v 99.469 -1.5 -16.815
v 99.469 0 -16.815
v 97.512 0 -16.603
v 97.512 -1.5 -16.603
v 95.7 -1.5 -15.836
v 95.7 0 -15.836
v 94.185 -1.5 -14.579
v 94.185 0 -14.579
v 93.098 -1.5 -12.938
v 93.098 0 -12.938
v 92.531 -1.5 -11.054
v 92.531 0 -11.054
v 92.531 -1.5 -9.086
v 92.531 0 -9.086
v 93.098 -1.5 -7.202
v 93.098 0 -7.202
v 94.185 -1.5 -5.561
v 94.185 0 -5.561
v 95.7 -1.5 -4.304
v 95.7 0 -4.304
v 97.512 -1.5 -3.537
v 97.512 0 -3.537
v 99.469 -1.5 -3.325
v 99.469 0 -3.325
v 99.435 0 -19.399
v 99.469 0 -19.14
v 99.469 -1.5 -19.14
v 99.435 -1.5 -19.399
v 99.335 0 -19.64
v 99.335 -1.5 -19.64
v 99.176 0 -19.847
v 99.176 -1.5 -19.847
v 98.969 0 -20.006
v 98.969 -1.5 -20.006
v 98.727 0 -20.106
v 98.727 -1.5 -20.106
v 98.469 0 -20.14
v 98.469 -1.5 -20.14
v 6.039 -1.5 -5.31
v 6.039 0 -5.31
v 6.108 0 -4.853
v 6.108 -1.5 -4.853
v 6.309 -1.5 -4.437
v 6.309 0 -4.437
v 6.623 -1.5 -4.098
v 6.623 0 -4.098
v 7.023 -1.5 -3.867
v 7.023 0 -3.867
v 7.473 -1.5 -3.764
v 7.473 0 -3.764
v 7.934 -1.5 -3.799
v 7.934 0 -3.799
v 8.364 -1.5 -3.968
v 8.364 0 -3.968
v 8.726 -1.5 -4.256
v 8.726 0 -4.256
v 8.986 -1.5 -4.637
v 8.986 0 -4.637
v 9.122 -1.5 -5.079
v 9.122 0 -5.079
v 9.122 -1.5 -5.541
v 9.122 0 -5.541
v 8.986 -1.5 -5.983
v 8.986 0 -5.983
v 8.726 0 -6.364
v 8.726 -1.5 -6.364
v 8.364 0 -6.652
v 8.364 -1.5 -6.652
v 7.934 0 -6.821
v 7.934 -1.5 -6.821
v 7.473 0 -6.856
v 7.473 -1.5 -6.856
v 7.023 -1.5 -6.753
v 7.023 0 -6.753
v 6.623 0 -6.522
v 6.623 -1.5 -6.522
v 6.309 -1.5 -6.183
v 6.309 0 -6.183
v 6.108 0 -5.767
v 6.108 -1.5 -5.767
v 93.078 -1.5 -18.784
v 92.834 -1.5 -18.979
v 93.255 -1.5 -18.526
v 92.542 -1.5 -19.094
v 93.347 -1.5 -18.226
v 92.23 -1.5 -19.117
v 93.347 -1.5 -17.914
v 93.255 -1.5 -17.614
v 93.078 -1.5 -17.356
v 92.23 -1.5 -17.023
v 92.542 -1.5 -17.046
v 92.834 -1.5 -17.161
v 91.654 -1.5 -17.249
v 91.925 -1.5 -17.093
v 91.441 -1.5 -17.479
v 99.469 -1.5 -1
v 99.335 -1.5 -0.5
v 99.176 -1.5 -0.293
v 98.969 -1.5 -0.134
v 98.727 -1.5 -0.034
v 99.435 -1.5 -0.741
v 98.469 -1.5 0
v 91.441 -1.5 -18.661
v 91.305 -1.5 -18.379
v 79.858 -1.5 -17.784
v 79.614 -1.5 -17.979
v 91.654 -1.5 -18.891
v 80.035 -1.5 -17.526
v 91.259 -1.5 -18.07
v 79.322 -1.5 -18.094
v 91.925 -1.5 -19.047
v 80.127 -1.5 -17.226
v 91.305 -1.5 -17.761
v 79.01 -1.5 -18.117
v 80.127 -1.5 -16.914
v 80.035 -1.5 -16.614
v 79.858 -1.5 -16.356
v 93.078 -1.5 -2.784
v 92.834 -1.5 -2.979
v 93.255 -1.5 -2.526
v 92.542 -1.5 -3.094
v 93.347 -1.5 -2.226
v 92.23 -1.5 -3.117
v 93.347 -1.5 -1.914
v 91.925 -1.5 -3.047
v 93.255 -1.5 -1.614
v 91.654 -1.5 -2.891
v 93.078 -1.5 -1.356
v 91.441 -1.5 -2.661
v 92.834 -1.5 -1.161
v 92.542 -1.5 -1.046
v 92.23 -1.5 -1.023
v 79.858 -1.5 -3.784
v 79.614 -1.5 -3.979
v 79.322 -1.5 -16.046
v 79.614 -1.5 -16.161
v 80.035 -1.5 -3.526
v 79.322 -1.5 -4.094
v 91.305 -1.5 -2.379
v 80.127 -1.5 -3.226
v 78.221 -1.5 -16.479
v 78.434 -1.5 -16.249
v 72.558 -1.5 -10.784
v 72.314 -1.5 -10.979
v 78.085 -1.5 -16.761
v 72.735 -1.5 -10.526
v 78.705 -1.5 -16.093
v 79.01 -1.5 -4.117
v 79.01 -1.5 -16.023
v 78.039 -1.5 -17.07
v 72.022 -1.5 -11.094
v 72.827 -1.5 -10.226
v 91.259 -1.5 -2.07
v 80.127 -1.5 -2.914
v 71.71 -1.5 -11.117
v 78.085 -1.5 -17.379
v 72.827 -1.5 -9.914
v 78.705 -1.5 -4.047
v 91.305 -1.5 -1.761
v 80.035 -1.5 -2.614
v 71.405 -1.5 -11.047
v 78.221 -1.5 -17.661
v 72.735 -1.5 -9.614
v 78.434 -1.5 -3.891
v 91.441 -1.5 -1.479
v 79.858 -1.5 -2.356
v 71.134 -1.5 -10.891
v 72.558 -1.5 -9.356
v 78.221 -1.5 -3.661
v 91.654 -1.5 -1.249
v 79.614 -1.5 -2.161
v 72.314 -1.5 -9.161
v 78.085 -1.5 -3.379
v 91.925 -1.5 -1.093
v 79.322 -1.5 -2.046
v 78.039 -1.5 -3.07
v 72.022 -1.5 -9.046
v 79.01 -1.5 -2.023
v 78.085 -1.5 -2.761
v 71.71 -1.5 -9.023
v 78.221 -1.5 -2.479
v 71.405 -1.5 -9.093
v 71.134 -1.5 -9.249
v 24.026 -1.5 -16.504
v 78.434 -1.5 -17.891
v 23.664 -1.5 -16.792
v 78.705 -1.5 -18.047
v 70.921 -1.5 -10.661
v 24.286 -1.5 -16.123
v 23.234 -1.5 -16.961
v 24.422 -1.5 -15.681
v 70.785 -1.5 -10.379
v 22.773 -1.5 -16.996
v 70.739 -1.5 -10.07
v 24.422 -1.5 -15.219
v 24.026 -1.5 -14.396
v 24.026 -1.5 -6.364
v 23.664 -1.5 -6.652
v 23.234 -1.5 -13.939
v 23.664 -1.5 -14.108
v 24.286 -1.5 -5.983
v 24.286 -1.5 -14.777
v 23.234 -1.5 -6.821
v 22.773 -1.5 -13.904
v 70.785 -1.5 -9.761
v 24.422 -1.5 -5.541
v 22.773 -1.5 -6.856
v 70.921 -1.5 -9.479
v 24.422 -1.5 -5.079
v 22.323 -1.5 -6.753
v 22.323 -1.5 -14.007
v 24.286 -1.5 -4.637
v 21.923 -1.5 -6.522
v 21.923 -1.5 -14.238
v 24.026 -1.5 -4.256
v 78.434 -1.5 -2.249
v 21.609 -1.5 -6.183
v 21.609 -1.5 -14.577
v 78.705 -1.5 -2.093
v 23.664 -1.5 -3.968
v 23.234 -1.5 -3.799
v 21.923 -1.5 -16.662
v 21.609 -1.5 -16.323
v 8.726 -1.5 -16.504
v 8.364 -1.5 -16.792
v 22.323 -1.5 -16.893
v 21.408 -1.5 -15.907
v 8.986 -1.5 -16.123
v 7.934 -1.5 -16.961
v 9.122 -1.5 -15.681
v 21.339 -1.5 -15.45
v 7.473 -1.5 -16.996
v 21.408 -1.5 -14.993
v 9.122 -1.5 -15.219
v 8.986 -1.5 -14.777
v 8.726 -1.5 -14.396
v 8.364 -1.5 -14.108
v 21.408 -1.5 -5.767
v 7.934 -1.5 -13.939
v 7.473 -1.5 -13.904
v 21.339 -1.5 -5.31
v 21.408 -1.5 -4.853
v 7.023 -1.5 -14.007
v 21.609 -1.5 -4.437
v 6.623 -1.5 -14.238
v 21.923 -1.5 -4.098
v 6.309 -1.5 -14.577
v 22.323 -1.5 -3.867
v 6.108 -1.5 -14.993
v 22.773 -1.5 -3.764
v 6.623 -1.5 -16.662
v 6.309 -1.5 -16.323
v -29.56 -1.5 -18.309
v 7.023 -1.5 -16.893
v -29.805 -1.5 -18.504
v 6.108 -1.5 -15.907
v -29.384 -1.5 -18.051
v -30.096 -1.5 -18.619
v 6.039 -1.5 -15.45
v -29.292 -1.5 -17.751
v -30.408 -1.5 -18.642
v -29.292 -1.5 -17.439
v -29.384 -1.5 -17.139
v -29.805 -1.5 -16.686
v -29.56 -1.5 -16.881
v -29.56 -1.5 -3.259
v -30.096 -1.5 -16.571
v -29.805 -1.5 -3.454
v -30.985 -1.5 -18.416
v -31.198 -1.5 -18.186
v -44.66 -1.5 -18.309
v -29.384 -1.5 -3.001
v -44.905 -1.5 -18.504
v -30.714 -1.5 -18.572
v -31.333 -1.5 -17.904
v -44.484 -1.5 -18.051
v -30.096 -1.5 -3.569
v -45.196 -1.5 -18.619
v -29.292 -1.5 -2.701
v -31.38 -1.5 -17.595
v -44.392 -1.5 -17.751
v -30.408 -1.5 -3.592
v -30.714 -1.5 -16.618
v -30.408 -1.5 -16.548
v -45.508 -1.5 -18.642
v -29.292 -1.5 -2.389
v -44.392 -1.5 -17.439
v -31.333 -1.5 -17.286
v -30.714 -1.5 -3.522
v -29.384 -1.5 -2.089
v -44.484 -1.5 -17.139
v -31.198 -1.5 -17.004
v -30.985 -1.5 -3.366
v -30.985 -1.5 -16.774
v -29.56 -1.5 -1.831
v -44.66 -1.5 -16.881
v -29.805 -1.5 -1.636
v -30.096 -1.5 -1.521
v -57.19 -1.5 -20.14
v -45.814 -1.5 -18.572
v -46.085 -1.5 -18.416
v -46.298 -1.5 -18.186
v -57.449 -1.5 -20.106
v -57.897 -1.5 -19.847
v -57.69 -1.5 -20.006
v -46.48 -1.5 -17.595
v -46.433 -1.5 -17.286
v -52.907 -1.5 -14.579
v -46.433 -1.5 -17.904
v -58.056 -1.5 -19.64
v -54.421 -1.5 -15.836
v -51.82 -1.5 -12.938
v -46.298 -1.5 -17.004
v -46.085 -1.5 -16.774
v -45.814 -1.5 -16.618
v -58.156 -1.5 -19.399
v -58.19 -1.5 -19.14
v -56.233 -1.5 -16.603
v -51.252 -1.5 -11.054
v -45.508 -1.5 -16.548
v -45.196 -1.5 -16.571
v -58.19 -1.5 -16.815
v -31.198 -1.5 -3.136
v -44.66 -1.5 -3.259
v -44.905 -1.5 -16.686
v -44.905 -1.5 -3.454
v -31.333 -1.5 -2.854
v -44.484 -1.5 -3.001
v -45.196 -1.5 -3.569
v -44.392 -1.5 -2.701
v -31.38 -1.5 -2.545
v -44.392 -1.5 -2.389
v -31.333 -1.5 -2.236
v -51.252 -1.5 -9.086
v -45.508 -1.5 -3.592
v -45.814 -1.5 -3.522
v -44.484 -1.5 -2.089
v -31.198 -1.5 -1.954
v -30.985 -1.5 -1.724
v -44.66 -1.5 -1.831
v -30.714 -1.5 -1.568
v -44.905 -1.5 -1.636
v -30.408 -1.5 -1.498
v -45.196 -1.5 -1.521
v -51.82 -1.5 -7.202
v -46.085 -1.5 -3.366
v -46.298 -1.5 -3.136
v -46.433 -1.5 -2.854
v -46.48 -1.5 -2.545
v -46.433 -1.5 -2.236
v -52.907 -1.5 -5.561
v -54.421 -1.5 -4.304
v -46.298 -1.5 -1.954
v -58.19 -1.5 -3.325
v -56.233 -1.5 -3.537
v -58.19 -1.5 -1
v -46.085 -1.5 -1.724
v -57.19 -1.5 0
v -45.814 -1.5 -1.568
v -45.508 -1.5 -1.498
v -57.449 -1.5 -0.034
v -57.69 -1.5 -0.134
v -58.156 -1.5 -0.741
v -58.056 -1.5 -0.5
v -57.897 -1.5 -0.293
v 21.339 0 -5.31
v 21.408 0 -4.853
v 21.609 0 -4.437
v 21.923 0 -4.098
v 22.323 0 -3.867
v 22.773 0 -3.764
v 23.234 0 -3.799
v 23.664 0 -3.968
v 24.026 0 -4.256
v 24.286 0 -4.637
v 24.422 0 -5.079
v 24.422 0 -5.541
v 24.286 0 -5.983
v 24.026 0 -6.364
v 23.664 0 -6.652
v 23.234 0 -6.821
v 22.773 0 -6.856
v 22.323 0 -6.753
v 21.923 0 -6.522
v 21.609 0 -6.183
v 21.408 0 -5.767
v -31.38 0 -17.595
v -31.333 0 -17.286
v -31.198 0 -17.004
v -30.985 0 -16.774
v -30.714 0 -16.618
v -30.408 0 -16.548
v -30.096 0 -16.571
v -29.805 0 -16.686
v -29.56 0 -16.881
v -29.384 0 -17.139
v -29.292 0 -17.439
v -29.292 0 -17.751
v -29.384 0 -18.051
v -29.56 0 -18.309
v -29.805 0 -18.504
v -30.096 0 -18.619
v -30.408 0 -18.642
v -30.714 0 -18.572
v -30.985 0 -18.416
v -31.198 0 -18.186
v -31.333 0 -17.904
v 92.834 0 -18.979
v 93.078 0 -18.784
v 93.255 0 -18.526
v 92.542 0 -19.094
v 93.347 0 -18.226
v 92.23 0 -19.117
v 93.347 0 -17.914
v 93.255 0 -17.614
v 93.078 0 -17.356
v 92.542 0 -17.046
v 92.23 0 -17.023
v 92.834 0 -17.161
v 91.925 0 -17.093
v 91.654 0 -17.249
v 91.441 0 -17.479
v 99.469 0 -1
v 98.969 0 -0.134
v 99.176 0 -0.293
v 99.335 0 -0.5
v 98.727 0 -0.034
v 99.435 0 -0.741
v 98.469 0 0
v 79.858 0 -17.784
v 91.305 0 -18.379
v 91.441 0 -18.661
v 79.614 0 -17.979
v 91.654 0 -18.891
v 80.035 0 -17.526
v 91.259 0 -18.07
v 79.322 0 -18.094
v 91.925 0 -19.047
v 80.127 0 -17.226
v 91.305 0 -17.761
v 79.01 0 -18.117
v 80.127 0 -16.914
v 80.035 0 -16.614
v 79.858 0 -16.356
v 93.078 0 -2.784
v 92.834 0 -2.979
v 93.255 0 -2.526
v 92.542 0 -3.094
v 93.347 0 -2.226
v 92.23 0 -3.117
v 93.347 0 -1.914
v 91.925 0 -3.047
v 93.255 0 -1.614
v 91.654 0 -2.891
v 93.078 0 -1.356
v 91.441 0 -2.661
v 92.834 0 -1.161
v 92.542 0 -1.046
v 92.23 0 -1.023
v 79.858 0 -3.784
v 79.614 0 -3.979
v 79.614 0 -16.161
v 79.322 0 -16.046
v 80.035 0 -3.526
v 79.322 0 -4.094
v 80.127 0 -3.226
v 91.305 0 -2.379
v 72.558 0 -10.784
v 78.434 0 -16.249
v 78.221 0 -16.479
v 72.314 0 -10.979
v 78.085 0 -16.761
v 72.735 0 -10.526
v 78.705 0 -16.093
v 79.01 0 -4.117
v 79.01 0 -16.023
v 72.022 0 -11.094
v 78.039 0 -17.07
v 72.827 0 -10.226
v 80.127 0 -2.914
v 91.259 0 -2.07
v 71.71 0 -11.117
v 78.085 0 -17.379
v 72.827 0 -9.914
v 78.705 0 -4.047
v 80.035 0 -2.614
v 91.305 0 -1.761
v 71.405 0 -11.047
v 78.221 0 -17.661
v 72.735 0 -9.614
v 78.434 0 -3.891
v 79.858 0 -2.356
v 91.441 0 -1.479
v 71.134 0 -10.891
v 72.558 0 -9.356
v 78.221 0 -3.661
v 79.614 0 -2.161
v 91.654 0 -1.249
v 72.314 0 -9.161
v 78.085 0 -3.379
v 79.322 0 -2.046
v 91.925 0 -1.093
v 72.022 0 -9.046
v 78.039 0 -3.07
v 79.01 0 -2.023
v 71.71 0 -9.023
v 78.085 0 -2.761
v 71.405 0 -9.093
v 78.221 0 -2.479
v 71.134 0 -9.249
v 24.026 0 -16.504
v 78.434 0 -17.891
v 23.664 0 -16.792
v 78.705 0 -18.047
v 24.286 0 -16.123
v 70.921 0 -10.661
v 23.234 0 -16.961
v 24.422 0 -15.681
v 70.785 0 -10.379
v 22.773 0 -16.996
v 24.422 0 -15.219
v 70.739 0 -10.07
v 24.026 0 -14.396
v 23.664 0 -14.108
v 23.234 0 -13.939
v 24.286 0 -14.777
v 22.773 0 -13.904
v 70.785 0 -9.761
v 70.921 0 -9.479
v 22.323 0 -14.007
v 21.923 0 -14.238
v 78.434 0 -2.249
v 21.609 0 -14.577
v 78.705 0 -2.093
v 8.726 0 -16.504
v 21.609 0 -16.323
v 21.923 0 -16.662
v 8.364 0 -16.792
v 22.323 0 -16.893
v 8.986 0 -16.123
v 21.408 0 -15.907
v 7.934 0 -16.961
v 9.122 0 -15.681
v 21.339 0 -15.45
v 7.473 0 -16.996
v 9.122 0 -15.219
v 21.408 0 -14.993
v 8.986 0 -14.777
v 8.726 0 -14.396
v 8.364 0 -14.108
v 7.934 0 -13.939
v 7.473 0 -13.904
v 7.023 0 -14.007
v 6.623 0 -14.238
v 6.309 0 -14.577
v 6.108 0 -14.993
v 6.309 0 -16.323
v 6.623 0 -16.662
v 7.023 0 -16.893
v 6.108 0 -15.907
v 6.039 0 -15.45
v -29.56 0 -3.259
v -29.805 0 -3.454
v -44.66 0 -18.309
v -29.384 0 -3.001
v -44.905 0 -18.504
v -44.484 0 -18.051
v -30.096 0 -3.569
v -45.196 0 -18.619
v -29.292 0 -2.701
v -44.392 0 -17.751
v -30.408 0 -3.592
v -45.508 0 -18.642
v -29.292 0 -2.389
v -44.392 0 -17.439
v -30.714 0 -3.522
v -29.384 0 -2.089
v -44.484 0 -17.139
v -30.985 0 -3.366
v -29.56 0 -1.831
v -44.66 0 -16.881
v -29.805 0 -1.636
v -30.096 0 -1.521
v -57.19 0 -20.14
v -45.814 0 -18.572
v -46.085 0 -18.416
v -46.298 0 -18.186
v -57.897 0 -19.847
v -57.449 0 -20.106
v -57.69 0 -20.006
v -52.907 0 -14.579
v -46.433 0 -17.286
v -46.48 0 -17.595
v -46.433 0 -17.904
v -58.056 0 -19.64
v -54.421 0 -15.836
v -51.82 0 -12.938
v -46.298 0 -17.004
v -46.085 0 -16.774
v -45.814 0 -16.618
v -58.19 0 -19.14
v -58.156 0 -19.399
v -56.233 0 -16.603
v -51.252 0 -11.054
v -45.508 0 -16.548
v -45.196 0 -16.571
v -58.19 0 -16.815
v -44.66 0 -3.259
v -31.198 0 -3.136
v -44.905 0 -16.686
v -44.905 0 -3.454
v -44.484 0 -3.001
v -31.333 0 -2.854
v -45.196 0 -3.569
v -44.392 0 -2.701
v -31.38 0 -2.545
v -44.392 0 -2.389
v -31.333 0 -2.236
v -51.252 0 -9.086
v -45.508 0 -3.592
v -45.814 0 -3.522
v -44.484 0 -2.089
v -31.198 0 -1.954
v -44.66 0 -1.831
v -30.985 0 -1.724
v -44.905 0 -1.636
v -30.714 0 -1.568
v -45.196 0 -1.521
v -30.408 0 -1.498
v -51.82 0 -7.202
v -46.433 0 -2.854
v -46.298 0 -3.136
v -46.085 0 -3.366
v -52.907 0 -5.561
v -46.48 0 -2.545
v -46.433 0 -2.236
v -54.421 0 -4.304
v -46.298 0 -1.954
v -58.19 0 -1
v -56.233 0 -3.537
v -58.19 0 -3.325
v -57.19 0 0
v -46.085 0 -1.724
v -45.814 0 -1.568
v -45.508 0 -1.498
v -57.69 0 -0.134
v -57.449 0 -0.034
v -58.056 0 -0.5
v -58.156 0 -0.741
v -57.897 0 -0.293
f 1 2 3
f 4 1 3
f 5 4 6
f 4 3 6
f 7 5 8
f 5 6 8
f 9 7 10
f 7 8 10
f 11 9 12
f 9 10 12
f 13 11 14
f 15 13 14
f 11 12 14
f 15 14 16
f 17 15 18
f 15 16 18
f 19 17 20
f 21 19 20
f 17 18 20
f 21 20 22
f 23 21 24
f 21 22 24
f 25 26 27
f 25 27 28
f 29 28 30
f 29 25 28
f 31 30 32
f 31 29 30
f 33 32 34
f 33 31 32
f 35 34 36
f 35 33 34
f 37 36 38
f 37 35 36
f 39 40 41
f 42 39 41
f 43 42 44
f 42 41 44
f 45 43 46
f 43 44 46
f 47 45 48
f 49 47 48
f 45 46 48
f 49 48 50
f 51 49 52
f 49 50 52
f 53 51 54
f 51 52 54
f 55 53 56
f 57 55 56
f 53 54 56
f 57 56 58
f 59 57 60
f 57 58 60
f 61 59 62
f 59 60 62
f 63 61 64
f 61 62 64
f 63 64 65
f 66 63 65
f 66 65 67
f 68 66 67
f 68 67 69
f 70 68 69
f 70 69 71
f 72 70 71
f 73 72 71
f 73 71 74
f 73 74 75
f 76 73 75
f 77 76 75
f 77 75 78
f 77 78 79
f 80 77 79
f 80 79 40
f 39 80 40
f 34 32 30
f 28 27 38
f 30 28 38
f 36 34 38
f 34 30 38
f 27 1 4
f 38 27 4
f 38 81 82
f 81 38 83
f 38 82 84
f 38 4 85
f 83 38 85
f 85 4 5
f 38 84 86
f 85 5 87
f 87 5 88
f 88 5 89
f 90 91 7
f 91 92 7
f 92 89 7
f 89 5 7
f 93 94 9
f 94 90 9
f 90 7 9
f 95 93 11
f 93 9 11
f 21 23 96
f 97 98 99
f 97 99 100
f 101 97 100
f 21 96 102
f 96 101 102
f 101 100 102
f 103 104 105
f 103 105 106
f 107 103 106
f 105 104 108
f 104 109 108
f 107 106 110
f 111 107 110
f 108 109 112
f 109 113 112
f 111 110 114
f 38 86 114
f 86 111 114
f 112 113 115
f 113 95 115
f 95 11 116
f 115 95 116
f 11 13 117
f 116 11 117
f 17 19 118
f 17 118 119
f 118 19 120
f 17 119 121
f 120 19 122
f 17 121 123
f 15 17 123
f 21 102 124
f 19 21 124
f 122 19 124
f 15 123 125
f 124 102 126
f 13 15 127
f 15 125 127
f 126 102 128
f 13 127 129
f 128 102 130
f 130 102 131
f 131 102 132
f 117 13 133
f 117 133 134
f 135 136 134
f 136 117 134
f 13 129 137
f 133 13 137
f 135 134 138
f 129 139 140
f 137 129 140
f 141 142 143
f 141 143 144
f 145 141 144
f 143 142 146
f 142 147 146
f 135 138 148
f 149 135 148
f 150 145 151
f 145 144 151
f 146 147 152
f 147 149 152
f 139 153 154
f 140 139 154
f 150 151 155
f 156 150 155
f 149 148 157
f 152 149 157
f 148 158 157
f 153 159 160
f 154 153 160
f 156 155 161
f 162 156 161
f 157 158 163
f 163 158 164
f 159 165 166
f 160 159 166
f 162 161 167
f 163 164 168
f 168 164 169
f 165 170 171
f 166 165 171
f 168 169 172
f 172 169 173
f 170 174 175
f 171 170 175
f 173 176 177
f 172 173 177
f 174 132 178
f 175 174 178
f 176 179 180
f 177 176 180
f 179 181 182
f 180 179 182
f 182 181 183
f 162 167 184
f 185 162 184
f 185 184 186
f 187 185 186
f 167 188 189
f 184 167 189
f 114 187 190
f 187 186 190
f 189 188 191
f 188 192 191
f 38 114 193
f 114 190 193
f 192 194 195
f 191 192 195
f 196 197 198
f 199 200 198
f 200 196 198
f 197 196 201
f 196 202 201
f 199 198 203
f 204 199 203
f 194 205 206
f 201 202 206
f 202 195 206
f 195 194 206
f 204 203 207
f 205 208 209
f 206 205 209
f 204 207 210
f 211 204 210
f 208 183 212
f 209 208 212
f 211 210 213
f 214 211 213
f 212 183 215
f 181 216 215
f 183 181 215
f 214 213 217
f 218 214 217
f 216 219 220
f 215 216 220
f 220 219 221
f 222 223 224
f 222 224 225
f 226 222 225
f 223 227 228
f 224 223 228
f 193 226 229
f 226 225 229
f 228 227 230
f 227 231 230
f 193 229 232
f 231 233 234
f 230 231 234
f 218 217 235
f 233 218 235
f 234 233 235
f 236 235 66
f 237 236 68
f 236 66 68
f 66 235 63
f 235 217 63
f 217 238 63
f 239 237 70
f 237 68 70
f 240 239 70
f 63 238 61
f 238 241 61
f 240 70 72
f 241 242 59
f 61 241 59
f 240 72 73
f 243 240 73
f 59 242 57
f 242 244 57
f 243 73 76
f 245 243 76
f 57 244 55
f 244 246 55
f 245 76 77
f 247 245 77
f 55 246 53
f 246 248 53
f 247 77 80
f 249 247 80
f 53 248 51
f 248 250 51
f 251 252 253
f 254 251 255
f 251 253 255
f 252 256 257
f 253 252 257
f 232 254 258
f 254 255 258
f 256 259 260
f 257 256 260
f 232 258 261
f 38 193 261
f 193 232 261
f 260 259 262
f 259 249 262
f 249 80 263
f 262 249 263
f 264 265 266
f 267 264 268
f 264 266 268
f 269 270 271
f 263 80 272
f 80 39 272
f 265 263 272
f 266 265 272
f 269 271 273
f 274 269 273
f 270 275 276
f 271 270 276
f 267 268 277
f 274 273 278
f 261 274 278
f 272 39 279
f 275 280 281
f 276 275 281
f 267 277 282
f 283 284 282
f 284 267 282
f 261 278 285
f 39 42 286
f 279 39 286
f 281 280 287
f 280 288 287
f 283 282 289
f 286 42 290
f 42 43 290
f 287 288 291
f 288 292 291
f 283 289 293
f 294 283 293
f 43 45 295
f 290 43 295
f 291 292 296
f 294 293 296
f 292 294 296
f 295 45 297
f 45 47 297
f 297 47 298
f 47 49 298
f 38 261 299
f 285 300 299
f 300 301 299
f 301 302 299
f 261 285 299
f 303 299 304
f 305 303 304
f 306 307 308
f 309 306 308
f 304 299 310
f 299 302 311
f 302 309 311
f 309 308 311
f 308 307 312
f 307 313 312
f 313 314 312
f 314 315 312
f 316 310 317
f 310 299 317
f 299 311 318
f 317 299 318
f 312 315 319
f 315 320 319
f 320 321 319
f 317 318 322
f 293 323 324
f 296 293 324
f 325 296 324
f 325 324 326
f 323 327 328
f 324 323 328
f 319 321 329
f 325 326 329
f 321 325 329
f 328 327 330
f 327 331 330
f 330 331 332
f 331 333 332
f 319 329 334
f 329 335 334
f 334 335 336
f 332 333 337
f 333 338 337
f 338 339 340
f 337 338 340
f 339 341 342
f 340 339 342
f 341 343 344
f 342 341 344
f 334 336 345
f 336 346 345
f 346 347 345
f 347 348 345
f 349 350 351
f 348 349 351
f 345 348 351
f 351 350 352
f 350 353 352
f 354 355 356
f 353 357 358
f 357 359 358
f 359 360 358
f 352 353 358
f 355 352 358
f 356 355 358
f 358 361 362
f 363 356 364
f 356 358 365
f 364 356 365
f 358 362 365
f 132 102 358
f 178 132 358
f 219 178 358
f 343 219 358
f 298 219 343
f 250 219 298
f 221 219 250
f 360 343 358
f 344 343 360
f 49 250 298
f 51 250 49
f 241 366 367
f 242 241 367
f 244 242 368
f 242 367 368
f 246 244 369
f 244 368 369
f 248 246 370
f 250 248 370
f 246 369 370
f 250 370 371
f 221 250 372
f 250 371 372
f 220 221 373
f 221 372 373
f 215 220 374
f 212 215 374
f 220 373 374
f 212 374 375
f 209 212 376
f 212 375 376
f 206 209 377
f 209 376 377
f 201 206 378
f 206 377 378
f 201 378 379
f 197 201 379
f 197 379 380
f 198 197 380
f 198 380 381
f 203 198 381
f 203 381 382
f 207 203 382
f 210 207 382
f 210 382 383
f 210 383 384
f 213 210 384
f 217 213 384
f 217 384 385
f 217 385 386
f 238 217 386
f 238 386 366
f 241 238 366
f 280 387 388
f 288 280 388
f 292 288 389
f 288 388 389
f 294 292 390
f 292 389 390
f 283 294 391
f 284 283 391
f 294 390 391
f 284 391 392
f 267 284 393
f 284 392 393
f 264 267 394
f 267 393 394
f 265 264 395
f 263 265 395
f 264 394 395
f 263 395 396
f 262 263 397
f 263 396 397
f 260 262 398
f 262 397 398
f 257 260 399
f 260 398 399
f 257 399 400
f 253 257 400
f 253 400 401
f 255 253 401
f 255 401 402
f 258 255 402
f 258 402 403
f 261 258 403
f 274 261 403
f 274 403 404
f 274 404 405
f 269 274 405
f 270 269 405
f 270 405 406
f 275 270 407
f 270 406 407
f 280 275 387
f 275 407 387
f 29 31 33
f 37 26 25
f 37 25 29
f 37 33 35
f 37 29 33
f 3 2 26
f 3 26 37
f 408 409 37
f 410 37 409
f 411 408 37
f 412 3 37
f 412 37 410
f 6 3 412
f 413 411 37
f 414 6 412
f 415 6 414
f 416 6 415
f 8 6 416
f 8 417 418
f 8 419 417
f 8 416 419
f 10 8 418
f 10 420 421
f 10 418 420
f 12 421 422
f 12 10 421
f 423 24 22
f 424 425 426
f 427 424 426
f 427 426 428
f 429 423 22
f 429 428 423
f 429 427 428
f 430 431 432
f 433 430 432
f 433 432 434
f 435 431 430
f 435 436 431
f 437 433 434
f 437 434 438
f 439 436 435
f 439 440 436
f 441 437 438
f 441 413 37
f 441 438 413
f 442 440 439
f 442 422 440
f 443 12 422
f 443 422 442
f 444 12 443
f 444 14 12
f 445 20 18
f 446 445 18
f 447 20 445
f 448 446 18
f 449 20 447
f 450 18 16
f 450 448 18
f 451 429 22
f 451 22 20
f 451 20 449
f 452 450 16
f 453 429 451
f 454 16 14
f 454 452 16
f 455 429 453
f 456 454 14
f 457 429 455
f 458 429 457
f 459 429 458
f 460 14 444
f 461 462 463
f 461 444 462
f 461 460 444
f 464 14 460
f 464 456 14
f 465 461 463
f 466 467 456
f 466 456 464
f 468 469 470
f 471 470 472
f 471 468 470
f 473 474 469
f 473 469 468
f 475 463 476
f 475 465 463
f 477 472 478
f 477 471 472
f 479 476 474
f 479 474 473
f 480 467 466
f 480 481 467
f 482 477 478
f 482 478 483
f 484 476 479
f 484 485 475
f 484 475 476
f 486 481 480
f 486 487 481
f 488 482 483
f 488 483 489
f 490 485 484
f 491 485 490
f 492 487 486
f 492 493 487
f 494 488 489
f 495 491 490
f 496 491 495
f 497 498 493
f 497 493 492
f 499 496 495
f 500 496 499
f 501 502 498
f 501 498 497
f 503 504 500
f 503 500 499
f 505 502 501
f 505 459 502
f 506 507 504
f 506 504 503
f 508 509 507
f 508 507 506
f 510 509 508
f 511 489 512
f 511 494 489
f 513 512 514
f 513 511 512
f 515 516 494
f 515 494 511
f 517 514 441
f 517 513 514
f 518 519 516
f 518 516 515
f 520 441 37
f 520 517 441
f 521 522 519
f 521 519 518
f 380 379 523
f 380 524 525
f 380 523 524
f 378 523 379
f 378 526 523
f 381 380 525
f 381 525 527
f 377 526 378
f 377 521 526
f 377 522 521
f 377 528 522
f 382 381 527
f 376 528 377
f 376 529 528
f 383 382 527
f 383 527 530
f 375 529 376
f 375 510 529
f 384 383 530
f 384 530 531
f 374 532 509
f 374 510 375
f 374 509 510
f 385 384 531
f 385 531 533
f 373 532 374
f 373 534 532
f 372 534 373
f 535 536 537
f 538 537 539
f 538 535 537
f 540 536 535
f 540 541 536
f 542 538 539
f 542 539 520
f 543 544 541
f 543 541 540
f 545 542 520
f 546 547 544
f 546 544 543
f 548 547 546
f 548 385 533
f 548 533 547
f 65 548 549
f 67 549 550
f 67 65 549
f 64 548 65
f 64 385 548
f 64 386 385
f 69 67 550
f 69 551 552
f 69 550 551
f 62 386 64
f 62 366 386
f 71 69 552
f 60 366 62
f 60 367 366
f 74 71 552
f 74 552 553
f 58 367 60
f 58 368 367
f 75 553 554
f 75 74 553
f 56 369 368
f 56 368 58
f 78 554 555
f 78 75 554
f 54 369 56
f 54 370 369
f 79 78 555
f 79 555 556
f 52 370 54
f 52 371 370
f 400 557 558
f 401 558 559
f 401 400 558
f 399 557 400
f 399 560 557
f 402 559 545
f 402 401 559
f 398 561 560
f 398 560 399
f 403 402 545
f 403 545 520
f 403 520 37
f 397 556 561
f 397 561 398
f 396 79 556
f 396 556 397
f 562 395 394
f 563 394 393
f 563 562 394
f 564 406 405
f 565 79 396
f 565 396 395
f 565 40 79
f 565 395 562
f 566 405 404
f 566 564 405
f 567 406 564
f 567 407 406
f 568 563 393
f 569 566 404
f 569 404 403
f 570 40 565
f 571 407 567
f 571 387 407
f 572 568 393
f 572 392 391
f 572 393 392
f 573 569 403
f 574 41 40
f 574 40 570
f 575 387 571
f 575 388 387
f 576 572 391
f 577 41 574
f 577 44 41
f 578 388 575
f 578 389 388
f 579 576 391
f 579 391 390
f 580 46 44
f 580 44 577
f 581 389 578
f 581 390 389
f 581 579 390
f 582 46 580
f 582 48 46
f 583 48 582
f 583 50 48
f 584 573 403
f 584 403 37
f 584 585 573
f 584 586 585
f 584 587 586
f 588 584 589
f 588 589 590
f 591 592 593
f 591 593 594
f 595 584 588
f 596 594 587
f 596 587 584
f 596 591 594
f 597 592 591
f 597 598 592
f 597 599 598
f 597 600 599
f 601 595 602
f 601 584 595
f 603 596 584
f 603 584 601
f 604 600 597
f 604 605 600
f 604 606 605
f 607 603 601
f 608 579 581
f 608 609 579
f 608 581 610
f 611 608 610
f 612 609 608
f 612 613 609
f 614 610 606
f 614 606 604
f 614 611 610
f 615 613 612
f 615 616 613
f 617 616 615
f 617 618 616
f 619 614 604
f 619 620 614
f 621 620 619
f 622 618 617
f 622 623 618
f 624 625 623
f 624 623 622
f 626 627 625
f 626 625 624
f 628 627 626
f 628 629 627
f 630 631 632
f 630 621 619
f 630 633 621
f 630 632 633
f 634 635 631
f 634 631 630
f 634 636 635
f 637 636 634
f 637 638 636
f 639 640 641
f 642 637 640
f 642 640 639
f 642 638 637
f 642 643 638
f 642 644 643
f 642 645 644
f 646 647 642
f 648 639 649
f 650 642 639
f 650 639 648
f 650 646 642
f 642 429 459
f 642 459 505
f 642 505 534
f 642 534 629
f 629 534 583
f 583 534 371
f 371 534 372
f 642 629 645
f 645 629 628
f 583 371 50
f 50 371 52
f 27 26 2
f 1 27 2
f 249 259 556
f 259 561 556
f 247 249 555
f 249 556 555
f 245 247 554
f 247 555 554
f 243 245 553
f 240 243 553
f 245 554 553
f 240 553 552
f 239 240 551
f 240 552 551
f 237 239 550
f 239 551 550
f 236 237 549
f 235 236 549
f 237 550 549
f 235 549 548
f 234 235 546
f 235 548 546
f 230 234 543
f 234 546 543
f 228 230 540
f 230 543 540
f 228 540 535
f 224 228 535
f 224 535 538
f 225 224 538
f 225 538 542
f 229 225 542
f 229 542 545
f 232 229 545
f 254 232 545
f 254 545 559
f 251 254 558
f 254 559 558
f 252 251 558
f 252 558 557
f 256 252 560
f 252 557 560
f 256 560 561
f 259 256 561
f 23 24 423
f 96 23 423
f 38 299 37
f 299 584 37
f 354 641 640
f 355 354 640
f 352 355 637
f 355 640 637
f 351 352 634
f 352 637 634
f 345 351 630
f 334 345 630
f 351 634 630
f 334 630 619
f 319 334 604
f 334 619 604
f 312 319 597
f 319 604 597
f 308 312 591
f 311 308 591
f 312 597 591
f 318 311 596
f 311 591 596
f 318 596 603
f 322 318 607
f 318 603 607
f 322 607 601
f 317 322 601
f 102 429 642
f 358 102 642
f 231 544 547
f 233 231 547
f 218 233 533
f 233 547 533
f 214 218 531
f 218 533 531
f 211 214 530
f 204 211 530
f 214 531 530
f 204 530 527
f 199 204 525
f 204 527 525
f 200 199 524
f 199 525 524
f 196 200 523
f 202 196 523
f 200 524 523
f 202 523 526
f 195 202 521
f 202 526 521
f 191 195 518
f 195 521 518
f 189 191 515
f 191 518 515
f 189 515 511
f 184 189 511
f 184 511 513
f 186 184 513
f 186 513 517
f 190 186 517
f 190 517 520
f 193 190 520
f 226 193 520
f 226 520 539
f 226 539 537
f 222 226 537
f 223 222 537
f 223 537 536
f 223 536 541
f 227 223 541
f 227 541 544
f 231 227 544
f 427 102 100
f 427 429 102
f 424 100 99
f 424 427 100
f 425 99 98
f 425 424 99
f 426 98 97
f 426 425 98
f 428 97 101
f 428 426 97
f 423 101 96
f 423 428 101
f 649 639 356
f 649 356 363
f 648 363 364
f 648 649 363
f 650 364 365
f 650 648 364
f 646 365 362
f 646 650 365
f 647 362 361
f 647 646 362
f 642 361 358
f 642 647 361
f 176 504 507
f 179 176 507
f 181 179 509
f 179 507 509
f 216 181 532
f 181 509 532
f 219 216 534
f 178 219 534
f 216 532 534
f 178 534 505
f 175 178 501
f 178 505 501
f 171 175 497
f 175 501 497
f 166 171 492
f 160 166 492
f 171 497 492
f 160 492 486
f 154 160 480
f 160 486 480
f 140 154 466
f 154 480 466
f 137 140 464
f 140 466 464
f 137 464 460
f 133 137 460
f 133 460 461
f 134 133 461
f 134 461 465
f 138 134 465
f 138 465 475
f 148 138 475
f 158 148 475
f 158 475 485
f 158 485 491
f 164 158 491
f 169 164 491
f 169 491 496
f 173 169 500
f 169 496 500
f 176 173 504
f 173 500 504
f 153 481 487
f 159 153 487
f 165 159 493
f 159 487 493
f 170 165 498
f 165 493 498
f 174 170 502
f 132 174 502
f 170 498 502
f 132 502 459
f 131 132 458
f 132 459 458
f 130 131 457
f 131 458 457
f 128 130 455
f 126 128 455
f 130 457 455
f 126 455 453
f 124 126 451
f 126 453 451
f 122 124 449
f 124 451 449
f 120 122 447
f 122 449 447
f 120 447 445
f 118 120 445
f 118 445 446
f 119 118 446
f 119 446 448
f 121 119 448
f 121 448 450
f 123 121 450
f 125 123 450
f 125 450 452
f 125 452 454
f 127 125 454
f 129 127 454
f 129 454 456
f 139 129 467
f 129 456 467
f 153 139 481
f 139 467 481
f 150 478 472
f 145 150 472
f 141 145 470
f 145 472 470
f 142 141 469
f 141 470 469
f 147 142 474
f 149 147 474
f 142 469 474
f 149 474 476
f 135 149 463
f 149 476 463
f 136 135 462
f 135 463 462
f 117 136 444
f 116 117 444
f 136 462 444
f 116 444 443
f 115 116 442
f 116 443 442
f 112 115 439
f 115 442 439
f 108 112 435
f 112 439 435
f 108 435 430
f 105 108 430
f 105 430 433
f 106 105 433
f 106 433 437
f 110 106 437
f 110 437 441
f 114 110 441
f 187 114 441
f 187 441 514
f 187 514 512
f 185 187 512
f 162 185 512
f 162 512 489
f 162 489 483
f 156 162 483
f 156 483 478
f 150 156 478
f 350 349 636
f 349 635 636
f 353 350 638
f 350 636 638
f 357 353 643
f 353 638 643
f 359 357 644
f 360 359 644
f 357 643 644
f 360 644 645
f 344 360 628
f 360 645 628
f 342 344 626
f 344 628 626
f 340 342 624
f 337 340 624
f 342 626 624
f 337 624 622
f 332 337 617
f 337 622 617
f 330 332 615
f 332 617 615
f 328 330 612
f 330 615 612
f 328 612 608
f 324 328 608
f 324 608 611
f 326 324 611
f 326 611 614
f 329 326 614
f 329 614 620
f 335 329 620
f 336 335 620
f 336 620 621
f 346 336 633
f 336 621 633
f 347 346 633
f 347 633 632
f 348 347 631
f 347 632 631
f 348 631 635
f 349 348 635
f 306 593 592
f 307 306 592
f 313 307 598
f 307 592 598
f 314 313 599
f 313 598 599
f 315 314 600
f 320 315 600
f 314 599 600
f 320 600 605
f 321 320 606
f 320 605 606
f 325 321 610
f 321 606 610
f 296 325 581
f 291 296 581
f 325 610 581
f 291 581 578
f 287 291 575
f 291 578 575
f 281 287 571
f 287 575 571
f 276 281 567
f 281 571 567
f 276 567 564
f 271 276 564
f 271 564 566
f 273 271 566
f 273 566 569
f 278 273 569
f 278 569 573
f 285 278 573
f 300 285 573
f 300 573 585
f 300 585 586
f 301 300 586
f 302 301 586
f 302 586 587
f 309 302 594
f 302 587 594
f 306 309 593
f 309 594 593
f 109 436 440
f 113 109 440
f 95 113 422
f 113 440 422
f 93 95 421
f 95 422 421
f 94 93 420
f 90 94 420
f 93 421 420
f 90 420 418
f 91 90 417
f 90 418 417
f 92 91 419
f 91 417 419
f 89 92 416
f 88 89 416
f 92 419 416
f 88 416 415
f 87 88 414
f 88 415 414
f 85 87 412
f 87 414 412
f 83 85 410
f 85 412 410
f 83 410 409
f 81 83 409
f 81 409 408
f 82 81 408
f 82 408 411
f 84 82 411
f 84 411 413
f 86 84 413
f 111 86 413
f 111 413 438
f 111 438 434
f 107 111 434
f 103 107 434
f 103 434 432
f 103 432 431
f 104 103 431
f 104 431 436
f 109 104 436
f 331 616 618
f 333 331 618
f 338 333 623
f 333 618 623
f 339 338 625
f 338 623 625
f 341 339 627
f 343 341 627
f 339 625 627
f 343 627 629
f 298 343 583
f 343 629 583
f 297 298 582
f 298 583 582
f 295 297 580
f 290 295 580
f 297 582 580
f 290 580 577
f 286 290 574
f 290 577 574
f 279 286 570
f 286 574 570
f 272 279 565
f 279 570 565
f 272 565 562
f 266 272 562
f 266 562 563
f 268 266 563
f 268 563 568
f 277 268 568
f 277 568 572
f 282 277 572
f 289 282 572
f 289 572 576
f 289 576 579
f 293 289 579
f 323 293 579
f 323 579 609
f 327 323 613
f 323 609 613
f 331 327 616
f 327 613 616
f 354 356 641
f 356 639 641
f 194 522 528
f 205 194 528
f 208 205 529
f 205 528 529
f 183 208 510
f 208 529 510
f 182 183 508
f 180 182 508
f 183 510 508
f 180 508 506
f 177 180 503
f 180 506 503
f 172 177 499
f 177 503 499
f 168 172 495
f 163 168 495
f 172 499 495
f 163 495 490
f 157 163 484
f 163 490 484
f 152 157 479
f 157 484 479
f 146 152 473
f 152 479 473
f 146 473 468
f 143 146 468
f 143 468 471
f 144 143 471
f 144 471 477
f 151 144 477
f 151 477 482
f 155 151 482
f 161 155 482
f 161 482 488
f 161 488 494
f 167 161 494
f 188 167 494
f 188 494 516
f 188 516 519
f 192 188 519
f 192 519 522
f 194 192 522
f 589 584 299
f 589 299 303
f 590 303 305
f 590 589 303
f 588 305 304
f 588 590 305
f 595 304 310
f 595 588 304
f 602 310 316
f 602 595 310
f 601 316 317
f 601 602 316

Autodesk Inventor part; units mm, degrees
ref_plane "YZ Plane" through (0, 0, 0) normal (1, 0, 0) x (0, 1, 0)
ref_plane "XZ Plane" through (0, 0, 0) normal (0, 1, 0) x (-1, 0, 0)
ref_plane "XY Plane" through (0, 0, 0) normal (0, 0, 1) x (1, 0, 0)
sketch "Sketch1" plane through (0, 0, 0) normal (0, 1, 0) x (-1, 0, 0)
  line L0 (-40.8289, 0) -> (-40.8289, -20.14)
  line L1 (-0.4496, -20.14) -> (-0.4496, 0)
  circle A0 centre (45.43, -2.545) radius 1.05
  circle A1 centre (45.43, -17.595) radius 1.05
  circle A2 centre (30.33, -2.545) radius 1.05
  circle A3 centre (30.33, -17.595) radius 1.05
  circle A4 centre (-22.8893, -5.31) radius 1.55
  circle A5 centre (-22.8893, -15.45) radius 1.55
  circle A6 centre (-7.5893, -5.31) radius 1.55
  circle A7 centre (-7.5893, -15.45) radius 1.55
  circle A8 centre (-92.3086, -18.07) radius 1.05
  circle A9 centre (-92.3086, -2.07) radius 1.05
  circle A10 centre (-79.0886, -17.07) radius 1.05
  circle A11 centre (-79.0886, -3.07) radius 1.05
  circle A12 centre (-71.7886, -10.07) radius 1.05
  arc A13 (58.19, -3.325) -> (58.19, -16.815) centre (57.93, -10.07) ccw
  line L2 (58.19, -16.815) -> (58.19, -19.14)
  arc A14 (-99.4686, -16.815) -> (-99.4686, -3.325) centre (-99.2086, -10.07) ccw
  line L3 (-99.4686, -19.14) -> (-99.4686, -16.815)
  arc A15 (-99.4686, -19.14) -> (-98.4686, -20.14) centre (-98.4686, -19.14) ccw
  line L4 (57.19, -20.14) -> (-98.4686, -20.14)
  arc A16 (57.19, -20.14) -> (58.19, -19.14) centre (57.19, -19.14) ccw
  line L5 (58.19, -1) -> (58.19, -3.325)
  arc A17 (58.19, -1) -> (57.19, 0) centre (57.19, -1) ccw
  line L6 (-98.4686, 0) -> (57.19, 0)
  arc A18 (-98.4686, 0) -> (-99.4686, -1) centre (-98.4686, -1) ccw
  line L7 (-99.4686, -3.325) -> (-99.4686, -1)
  line L8 (-41.2786, -20.14) -> (-41.2786, 0)
  line L9 (-40.3793, 0) -> (-40.3793, -20.14)
  line L10 (-0.8993, -20.14) -> (-0.8993, 0)
  line L11 (0, 0) -> (0, -20.14)
extrude "Extrusion1" add sketch "Sketch1" against normal blind 1.5
properties part number "axis_21_top_frame"
